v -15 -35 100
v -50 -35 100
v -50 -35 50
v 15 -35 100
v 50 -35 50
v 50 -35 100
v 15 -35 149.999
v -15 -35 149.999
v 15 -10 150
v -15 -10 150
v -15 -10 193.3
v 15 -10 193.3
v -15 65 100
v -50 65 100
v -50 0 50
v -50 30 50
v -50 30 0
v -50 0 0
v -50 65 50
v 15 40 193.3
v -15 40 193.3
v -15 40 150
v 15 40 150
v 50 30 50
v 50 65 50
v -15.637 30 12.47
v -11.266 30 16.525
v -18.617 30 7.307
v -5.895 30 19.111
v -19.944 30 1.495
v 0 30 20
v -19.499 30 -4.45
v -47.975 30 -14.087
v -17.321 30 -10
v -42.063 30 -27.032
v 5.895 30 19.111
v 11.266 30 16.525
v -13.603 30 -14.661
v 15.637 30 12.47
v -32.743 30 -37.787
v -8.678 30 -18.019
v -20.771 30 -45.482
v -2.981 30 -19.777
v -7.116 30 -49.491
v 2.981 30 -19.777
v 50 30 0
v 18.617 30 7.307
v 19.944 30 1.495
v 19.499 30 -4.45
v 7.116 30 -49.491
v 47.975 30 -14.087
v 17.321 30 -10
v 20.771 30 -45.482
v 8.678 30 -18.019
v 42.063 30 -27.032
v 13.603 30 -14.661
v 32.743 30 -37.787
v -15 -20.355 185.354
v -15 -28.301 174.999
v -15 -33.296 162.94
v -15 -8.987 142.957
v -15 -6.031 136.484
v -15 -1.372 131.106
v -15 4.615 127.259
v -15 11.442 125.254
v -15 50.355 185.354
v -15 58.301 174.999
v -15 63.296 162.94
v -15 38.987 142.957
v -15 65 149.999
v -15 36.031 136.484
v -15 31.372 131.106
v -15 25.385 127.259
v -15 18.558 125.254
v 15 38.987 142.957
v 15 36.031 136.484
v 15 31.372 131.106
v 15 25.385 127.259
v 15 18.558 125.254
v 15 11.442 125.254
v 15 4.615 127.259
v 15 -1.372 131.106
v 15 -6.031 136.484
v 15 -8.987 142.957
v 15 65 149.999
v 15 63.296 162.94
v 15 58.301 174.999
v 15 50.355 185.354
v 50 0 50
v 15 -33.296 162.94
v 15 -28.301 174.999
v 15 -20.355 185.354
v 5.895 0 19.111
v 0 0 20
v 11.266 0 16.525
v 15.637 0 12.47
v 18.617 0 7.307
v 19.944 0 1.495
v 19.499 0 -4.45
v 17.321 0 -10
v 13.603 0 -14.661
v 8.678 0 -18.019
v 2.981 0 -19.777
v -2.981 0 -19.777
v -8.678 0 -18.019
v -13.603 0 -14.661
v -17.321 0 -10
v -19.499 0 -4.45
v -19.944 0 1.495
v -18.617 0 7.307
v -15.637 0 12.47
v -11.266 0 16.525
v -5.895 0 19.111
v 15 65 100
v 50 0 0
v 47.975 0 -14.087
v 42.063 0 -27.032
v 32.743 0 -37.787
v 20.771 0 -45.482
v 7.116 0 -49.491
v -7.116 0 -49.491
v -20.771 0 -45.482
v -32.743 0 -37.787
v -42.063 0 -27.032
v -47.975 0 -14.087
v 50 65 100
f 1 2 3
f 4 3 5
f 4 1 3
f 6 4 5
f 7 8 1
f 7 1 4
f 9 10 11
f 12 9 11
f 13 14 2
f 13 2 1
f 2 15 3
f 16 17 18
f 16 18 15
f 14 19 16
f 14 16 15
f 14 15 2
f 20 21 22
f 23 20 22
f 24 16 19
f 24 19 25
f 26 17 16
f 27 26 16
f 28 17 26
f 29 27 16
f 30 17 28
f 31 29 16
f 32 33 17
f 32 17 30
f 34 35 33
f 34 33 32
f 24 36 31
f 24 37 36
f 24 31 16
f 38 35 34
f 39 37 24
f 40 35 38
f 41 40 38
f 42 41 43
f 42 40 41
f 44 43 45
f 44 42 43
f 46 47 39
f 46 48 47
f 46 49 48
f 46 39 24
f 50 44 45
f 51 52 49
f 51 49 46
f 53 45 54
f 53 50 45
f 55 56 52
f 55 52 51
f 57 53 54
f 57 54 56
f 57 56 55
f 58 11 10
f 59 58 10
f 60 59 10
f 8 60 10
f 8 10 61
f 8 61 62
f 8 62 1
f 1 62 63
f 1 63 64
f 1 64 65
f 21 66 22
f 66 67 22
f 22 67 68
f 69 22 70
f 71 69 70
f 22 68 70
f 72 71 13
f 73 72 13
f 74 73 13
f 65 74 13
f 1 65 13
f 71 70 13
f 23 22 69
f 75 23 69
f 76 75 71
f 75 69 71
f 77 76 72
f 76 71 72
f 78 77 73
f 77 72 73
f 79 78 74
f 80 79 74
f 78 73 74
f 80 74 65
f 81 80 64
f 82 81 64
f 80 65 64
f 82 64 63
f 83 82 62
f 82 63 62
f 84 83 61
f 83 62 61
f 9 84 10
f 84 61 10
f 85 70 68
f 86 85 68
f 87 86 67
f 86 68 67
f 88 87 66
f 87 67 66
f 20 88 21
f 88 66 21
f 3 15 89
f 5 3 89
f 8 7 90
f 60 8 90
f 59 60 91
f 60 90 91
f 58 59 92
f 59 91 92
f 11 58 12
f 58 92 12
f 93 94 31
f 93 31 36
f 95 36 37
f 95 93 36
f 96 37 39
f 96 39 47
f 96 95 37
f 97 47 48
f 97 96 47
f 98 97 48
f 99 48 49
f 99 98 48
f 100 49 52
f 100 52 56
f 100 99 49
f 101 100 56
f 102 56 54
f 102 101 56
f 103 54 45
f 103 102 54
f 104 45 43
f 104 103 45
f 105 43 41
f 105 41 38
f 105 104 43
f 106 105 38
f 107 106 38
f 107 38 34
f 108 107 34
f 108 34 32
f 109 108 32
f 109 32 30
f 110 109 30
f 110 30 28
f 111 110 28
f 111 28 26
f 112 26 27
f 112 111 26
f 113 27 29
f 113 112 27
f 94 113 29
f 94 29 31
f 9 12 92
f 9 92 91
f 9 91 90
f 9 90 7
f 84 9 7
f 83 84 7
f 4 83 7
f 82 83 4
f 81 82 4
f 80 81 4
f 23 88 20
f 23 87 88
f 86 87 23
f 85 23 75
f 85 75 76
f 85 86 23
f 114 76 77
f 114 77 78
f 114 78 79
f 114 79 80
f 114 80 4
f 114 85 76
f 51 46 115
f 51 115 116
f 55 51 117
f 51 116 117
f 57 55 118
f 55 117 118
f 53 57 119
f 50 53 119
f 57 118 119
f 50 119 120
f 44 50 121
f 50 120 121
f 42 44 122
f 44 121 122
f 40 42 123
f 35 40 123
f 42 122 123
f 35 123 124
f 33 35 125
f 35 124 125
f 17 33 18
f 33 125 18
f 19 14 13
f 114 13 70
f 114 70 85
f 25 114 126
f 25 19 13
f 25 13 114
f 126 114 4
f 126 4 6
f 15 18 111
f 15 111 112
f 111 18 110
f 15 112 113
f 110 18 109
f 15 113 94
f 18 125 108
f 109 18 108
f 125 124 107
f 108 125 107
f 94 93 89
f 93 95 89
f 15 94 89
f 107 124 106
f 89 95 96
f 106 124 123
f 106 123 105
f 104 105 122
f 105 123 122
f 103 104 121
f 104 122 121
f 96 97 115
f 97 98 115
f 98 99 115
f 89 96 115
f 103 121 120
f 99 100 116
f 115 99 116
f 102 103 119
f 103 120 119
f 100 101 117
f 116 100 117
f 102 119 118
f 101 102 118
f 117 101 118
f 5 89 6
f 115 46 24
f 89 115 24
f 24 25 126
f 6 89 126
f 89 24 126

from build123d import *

# Parameters (mm, degrees)
CROQUIS3_R                   = 20
SALIENTE_EXTRUIR1_DEPTH      = 30
CROQUIS4_W                   = 100
CROQUIS4_H                   = 50
SALIENTE_EXTRUIR2_DEPTH      = 65
CROQUIS5_W                   = 100
CROQUIS5_H                   = 50
SALIENTE_EXTRUIR3_DEPTH      = 35
SALIENTE_EXTRUIR4_DEPTH      = 15
SALIENTE_EXTRUIR4_DEPTH_BACK = 15
REDONDEO2_R                  = 50


with BuildPart() as part:
    # Croquis3 → Saliente-Extruir1 (new body)
    with BuildSketch(Plane(origin=(0, 0, 0), x_dir=(1, 0, 0), z_dir=(0, 1, 0))):
        with BuildLine():
            Line((-50, 0), (-50, -50))
            Line((-50, -50), (50, -50))
            Line((50, -50), (50, 0))
            ThreePointArc((50, 0), (0, 50), (-50, 0))
        make_face()
        with Locations(Location((0, 0, 0), (0, 0, 270))):
            Circle(CROQUIS3_R, mode=Mode.SUBTRACT)
    extrude(amount=SALIENTE_EXTRUIR1_DEPTH)

    # Croquis4 → Saliente-Extruir2 (add)
    with BuildSketch(Plane(origin=(0, 0, 0), x_dir=(1, 0, 0), z_dir=(0, 1, 0))):
        with Locations((0, -75)):
            Rectangle(CROQUIS4_W, CROQUIS4_H)
    extrude(amount=SALIENTE_EXTRUIR2_DEPTH)

    # Croquis5 → Saliente-Extruir3 (add)
    with BuildSketch(Plane.XZ):
        with Locations((0, 75)):
            Rectangle(CROQUIS5_W, CROQUIS5_H)
    extrude(amount=SALIENTE_EXTRUIR3_DEPTH)

    # Croquis6 → Saliente-Extruir4 (add, two sides: drawn at the far end of the back side and taken through both)
    with BuildSketch(Plane(origin=(0, 0, 0), x_dir=(0, 0, -1), z_dir=(1, 0, 0)).offset(-SALIENTE_EXTRUIR4_DEPTH_BACK)):
        with BuildLine():
            Line((-100, 65), (-193.3, 65))
            Line((-193.3, 65), (-193.3, 40))
            Line((-193.3, 40), (-150, 40))
            ThreePointArc((-150, 40), (-125, 15), (-150, -10))
            Line((-150, -10), (-193.3, -10))
            Line((-193.3, -10), (-193.3, -35))
            Line((-193.3, -35), (-100, -35))
            Line((-100, -35), (-100, 65))
        make_face()
    extrude(amount=SALIENTE_EXTRUIR4_DEPTH + SALIENTE_EXTRUIR4_DEPTH_BACK)

    # Redondeo2
    # the kernel refuses this fillet: 50 mm, written as the material it takes off along each edge
    with BuildSketch(Plane(origin=(123.253175473, -35, 193.3), x_dir=(0, 0, -1), z_dir=(-1, 0, 0)), Plane(origin=(-123.253175473, 65, 193.3), x_dir=(0, 0, -1), z_dir=(1, 0, 0))) as redondeo2_piece_1:
        with BuildLine():
            CenterArc((43.301270189, -50), REDONDEO2_R, 90, 60)
            Line((0, -25), (-0.866025404, -24.5))
            ThreePointArc((-0.866025404, -24.5), (-1, -12.5), (-1, 0))
            Line((-1, 0), (0, 1))
            Line((0, 1), (43.301270189, 1))
            Line((43.301270189, 1), (43.301270189, 0))
        make_face()
    extrude(amount=246.506350946, mode=Mode.SUBTRACT)


solid = part.part
